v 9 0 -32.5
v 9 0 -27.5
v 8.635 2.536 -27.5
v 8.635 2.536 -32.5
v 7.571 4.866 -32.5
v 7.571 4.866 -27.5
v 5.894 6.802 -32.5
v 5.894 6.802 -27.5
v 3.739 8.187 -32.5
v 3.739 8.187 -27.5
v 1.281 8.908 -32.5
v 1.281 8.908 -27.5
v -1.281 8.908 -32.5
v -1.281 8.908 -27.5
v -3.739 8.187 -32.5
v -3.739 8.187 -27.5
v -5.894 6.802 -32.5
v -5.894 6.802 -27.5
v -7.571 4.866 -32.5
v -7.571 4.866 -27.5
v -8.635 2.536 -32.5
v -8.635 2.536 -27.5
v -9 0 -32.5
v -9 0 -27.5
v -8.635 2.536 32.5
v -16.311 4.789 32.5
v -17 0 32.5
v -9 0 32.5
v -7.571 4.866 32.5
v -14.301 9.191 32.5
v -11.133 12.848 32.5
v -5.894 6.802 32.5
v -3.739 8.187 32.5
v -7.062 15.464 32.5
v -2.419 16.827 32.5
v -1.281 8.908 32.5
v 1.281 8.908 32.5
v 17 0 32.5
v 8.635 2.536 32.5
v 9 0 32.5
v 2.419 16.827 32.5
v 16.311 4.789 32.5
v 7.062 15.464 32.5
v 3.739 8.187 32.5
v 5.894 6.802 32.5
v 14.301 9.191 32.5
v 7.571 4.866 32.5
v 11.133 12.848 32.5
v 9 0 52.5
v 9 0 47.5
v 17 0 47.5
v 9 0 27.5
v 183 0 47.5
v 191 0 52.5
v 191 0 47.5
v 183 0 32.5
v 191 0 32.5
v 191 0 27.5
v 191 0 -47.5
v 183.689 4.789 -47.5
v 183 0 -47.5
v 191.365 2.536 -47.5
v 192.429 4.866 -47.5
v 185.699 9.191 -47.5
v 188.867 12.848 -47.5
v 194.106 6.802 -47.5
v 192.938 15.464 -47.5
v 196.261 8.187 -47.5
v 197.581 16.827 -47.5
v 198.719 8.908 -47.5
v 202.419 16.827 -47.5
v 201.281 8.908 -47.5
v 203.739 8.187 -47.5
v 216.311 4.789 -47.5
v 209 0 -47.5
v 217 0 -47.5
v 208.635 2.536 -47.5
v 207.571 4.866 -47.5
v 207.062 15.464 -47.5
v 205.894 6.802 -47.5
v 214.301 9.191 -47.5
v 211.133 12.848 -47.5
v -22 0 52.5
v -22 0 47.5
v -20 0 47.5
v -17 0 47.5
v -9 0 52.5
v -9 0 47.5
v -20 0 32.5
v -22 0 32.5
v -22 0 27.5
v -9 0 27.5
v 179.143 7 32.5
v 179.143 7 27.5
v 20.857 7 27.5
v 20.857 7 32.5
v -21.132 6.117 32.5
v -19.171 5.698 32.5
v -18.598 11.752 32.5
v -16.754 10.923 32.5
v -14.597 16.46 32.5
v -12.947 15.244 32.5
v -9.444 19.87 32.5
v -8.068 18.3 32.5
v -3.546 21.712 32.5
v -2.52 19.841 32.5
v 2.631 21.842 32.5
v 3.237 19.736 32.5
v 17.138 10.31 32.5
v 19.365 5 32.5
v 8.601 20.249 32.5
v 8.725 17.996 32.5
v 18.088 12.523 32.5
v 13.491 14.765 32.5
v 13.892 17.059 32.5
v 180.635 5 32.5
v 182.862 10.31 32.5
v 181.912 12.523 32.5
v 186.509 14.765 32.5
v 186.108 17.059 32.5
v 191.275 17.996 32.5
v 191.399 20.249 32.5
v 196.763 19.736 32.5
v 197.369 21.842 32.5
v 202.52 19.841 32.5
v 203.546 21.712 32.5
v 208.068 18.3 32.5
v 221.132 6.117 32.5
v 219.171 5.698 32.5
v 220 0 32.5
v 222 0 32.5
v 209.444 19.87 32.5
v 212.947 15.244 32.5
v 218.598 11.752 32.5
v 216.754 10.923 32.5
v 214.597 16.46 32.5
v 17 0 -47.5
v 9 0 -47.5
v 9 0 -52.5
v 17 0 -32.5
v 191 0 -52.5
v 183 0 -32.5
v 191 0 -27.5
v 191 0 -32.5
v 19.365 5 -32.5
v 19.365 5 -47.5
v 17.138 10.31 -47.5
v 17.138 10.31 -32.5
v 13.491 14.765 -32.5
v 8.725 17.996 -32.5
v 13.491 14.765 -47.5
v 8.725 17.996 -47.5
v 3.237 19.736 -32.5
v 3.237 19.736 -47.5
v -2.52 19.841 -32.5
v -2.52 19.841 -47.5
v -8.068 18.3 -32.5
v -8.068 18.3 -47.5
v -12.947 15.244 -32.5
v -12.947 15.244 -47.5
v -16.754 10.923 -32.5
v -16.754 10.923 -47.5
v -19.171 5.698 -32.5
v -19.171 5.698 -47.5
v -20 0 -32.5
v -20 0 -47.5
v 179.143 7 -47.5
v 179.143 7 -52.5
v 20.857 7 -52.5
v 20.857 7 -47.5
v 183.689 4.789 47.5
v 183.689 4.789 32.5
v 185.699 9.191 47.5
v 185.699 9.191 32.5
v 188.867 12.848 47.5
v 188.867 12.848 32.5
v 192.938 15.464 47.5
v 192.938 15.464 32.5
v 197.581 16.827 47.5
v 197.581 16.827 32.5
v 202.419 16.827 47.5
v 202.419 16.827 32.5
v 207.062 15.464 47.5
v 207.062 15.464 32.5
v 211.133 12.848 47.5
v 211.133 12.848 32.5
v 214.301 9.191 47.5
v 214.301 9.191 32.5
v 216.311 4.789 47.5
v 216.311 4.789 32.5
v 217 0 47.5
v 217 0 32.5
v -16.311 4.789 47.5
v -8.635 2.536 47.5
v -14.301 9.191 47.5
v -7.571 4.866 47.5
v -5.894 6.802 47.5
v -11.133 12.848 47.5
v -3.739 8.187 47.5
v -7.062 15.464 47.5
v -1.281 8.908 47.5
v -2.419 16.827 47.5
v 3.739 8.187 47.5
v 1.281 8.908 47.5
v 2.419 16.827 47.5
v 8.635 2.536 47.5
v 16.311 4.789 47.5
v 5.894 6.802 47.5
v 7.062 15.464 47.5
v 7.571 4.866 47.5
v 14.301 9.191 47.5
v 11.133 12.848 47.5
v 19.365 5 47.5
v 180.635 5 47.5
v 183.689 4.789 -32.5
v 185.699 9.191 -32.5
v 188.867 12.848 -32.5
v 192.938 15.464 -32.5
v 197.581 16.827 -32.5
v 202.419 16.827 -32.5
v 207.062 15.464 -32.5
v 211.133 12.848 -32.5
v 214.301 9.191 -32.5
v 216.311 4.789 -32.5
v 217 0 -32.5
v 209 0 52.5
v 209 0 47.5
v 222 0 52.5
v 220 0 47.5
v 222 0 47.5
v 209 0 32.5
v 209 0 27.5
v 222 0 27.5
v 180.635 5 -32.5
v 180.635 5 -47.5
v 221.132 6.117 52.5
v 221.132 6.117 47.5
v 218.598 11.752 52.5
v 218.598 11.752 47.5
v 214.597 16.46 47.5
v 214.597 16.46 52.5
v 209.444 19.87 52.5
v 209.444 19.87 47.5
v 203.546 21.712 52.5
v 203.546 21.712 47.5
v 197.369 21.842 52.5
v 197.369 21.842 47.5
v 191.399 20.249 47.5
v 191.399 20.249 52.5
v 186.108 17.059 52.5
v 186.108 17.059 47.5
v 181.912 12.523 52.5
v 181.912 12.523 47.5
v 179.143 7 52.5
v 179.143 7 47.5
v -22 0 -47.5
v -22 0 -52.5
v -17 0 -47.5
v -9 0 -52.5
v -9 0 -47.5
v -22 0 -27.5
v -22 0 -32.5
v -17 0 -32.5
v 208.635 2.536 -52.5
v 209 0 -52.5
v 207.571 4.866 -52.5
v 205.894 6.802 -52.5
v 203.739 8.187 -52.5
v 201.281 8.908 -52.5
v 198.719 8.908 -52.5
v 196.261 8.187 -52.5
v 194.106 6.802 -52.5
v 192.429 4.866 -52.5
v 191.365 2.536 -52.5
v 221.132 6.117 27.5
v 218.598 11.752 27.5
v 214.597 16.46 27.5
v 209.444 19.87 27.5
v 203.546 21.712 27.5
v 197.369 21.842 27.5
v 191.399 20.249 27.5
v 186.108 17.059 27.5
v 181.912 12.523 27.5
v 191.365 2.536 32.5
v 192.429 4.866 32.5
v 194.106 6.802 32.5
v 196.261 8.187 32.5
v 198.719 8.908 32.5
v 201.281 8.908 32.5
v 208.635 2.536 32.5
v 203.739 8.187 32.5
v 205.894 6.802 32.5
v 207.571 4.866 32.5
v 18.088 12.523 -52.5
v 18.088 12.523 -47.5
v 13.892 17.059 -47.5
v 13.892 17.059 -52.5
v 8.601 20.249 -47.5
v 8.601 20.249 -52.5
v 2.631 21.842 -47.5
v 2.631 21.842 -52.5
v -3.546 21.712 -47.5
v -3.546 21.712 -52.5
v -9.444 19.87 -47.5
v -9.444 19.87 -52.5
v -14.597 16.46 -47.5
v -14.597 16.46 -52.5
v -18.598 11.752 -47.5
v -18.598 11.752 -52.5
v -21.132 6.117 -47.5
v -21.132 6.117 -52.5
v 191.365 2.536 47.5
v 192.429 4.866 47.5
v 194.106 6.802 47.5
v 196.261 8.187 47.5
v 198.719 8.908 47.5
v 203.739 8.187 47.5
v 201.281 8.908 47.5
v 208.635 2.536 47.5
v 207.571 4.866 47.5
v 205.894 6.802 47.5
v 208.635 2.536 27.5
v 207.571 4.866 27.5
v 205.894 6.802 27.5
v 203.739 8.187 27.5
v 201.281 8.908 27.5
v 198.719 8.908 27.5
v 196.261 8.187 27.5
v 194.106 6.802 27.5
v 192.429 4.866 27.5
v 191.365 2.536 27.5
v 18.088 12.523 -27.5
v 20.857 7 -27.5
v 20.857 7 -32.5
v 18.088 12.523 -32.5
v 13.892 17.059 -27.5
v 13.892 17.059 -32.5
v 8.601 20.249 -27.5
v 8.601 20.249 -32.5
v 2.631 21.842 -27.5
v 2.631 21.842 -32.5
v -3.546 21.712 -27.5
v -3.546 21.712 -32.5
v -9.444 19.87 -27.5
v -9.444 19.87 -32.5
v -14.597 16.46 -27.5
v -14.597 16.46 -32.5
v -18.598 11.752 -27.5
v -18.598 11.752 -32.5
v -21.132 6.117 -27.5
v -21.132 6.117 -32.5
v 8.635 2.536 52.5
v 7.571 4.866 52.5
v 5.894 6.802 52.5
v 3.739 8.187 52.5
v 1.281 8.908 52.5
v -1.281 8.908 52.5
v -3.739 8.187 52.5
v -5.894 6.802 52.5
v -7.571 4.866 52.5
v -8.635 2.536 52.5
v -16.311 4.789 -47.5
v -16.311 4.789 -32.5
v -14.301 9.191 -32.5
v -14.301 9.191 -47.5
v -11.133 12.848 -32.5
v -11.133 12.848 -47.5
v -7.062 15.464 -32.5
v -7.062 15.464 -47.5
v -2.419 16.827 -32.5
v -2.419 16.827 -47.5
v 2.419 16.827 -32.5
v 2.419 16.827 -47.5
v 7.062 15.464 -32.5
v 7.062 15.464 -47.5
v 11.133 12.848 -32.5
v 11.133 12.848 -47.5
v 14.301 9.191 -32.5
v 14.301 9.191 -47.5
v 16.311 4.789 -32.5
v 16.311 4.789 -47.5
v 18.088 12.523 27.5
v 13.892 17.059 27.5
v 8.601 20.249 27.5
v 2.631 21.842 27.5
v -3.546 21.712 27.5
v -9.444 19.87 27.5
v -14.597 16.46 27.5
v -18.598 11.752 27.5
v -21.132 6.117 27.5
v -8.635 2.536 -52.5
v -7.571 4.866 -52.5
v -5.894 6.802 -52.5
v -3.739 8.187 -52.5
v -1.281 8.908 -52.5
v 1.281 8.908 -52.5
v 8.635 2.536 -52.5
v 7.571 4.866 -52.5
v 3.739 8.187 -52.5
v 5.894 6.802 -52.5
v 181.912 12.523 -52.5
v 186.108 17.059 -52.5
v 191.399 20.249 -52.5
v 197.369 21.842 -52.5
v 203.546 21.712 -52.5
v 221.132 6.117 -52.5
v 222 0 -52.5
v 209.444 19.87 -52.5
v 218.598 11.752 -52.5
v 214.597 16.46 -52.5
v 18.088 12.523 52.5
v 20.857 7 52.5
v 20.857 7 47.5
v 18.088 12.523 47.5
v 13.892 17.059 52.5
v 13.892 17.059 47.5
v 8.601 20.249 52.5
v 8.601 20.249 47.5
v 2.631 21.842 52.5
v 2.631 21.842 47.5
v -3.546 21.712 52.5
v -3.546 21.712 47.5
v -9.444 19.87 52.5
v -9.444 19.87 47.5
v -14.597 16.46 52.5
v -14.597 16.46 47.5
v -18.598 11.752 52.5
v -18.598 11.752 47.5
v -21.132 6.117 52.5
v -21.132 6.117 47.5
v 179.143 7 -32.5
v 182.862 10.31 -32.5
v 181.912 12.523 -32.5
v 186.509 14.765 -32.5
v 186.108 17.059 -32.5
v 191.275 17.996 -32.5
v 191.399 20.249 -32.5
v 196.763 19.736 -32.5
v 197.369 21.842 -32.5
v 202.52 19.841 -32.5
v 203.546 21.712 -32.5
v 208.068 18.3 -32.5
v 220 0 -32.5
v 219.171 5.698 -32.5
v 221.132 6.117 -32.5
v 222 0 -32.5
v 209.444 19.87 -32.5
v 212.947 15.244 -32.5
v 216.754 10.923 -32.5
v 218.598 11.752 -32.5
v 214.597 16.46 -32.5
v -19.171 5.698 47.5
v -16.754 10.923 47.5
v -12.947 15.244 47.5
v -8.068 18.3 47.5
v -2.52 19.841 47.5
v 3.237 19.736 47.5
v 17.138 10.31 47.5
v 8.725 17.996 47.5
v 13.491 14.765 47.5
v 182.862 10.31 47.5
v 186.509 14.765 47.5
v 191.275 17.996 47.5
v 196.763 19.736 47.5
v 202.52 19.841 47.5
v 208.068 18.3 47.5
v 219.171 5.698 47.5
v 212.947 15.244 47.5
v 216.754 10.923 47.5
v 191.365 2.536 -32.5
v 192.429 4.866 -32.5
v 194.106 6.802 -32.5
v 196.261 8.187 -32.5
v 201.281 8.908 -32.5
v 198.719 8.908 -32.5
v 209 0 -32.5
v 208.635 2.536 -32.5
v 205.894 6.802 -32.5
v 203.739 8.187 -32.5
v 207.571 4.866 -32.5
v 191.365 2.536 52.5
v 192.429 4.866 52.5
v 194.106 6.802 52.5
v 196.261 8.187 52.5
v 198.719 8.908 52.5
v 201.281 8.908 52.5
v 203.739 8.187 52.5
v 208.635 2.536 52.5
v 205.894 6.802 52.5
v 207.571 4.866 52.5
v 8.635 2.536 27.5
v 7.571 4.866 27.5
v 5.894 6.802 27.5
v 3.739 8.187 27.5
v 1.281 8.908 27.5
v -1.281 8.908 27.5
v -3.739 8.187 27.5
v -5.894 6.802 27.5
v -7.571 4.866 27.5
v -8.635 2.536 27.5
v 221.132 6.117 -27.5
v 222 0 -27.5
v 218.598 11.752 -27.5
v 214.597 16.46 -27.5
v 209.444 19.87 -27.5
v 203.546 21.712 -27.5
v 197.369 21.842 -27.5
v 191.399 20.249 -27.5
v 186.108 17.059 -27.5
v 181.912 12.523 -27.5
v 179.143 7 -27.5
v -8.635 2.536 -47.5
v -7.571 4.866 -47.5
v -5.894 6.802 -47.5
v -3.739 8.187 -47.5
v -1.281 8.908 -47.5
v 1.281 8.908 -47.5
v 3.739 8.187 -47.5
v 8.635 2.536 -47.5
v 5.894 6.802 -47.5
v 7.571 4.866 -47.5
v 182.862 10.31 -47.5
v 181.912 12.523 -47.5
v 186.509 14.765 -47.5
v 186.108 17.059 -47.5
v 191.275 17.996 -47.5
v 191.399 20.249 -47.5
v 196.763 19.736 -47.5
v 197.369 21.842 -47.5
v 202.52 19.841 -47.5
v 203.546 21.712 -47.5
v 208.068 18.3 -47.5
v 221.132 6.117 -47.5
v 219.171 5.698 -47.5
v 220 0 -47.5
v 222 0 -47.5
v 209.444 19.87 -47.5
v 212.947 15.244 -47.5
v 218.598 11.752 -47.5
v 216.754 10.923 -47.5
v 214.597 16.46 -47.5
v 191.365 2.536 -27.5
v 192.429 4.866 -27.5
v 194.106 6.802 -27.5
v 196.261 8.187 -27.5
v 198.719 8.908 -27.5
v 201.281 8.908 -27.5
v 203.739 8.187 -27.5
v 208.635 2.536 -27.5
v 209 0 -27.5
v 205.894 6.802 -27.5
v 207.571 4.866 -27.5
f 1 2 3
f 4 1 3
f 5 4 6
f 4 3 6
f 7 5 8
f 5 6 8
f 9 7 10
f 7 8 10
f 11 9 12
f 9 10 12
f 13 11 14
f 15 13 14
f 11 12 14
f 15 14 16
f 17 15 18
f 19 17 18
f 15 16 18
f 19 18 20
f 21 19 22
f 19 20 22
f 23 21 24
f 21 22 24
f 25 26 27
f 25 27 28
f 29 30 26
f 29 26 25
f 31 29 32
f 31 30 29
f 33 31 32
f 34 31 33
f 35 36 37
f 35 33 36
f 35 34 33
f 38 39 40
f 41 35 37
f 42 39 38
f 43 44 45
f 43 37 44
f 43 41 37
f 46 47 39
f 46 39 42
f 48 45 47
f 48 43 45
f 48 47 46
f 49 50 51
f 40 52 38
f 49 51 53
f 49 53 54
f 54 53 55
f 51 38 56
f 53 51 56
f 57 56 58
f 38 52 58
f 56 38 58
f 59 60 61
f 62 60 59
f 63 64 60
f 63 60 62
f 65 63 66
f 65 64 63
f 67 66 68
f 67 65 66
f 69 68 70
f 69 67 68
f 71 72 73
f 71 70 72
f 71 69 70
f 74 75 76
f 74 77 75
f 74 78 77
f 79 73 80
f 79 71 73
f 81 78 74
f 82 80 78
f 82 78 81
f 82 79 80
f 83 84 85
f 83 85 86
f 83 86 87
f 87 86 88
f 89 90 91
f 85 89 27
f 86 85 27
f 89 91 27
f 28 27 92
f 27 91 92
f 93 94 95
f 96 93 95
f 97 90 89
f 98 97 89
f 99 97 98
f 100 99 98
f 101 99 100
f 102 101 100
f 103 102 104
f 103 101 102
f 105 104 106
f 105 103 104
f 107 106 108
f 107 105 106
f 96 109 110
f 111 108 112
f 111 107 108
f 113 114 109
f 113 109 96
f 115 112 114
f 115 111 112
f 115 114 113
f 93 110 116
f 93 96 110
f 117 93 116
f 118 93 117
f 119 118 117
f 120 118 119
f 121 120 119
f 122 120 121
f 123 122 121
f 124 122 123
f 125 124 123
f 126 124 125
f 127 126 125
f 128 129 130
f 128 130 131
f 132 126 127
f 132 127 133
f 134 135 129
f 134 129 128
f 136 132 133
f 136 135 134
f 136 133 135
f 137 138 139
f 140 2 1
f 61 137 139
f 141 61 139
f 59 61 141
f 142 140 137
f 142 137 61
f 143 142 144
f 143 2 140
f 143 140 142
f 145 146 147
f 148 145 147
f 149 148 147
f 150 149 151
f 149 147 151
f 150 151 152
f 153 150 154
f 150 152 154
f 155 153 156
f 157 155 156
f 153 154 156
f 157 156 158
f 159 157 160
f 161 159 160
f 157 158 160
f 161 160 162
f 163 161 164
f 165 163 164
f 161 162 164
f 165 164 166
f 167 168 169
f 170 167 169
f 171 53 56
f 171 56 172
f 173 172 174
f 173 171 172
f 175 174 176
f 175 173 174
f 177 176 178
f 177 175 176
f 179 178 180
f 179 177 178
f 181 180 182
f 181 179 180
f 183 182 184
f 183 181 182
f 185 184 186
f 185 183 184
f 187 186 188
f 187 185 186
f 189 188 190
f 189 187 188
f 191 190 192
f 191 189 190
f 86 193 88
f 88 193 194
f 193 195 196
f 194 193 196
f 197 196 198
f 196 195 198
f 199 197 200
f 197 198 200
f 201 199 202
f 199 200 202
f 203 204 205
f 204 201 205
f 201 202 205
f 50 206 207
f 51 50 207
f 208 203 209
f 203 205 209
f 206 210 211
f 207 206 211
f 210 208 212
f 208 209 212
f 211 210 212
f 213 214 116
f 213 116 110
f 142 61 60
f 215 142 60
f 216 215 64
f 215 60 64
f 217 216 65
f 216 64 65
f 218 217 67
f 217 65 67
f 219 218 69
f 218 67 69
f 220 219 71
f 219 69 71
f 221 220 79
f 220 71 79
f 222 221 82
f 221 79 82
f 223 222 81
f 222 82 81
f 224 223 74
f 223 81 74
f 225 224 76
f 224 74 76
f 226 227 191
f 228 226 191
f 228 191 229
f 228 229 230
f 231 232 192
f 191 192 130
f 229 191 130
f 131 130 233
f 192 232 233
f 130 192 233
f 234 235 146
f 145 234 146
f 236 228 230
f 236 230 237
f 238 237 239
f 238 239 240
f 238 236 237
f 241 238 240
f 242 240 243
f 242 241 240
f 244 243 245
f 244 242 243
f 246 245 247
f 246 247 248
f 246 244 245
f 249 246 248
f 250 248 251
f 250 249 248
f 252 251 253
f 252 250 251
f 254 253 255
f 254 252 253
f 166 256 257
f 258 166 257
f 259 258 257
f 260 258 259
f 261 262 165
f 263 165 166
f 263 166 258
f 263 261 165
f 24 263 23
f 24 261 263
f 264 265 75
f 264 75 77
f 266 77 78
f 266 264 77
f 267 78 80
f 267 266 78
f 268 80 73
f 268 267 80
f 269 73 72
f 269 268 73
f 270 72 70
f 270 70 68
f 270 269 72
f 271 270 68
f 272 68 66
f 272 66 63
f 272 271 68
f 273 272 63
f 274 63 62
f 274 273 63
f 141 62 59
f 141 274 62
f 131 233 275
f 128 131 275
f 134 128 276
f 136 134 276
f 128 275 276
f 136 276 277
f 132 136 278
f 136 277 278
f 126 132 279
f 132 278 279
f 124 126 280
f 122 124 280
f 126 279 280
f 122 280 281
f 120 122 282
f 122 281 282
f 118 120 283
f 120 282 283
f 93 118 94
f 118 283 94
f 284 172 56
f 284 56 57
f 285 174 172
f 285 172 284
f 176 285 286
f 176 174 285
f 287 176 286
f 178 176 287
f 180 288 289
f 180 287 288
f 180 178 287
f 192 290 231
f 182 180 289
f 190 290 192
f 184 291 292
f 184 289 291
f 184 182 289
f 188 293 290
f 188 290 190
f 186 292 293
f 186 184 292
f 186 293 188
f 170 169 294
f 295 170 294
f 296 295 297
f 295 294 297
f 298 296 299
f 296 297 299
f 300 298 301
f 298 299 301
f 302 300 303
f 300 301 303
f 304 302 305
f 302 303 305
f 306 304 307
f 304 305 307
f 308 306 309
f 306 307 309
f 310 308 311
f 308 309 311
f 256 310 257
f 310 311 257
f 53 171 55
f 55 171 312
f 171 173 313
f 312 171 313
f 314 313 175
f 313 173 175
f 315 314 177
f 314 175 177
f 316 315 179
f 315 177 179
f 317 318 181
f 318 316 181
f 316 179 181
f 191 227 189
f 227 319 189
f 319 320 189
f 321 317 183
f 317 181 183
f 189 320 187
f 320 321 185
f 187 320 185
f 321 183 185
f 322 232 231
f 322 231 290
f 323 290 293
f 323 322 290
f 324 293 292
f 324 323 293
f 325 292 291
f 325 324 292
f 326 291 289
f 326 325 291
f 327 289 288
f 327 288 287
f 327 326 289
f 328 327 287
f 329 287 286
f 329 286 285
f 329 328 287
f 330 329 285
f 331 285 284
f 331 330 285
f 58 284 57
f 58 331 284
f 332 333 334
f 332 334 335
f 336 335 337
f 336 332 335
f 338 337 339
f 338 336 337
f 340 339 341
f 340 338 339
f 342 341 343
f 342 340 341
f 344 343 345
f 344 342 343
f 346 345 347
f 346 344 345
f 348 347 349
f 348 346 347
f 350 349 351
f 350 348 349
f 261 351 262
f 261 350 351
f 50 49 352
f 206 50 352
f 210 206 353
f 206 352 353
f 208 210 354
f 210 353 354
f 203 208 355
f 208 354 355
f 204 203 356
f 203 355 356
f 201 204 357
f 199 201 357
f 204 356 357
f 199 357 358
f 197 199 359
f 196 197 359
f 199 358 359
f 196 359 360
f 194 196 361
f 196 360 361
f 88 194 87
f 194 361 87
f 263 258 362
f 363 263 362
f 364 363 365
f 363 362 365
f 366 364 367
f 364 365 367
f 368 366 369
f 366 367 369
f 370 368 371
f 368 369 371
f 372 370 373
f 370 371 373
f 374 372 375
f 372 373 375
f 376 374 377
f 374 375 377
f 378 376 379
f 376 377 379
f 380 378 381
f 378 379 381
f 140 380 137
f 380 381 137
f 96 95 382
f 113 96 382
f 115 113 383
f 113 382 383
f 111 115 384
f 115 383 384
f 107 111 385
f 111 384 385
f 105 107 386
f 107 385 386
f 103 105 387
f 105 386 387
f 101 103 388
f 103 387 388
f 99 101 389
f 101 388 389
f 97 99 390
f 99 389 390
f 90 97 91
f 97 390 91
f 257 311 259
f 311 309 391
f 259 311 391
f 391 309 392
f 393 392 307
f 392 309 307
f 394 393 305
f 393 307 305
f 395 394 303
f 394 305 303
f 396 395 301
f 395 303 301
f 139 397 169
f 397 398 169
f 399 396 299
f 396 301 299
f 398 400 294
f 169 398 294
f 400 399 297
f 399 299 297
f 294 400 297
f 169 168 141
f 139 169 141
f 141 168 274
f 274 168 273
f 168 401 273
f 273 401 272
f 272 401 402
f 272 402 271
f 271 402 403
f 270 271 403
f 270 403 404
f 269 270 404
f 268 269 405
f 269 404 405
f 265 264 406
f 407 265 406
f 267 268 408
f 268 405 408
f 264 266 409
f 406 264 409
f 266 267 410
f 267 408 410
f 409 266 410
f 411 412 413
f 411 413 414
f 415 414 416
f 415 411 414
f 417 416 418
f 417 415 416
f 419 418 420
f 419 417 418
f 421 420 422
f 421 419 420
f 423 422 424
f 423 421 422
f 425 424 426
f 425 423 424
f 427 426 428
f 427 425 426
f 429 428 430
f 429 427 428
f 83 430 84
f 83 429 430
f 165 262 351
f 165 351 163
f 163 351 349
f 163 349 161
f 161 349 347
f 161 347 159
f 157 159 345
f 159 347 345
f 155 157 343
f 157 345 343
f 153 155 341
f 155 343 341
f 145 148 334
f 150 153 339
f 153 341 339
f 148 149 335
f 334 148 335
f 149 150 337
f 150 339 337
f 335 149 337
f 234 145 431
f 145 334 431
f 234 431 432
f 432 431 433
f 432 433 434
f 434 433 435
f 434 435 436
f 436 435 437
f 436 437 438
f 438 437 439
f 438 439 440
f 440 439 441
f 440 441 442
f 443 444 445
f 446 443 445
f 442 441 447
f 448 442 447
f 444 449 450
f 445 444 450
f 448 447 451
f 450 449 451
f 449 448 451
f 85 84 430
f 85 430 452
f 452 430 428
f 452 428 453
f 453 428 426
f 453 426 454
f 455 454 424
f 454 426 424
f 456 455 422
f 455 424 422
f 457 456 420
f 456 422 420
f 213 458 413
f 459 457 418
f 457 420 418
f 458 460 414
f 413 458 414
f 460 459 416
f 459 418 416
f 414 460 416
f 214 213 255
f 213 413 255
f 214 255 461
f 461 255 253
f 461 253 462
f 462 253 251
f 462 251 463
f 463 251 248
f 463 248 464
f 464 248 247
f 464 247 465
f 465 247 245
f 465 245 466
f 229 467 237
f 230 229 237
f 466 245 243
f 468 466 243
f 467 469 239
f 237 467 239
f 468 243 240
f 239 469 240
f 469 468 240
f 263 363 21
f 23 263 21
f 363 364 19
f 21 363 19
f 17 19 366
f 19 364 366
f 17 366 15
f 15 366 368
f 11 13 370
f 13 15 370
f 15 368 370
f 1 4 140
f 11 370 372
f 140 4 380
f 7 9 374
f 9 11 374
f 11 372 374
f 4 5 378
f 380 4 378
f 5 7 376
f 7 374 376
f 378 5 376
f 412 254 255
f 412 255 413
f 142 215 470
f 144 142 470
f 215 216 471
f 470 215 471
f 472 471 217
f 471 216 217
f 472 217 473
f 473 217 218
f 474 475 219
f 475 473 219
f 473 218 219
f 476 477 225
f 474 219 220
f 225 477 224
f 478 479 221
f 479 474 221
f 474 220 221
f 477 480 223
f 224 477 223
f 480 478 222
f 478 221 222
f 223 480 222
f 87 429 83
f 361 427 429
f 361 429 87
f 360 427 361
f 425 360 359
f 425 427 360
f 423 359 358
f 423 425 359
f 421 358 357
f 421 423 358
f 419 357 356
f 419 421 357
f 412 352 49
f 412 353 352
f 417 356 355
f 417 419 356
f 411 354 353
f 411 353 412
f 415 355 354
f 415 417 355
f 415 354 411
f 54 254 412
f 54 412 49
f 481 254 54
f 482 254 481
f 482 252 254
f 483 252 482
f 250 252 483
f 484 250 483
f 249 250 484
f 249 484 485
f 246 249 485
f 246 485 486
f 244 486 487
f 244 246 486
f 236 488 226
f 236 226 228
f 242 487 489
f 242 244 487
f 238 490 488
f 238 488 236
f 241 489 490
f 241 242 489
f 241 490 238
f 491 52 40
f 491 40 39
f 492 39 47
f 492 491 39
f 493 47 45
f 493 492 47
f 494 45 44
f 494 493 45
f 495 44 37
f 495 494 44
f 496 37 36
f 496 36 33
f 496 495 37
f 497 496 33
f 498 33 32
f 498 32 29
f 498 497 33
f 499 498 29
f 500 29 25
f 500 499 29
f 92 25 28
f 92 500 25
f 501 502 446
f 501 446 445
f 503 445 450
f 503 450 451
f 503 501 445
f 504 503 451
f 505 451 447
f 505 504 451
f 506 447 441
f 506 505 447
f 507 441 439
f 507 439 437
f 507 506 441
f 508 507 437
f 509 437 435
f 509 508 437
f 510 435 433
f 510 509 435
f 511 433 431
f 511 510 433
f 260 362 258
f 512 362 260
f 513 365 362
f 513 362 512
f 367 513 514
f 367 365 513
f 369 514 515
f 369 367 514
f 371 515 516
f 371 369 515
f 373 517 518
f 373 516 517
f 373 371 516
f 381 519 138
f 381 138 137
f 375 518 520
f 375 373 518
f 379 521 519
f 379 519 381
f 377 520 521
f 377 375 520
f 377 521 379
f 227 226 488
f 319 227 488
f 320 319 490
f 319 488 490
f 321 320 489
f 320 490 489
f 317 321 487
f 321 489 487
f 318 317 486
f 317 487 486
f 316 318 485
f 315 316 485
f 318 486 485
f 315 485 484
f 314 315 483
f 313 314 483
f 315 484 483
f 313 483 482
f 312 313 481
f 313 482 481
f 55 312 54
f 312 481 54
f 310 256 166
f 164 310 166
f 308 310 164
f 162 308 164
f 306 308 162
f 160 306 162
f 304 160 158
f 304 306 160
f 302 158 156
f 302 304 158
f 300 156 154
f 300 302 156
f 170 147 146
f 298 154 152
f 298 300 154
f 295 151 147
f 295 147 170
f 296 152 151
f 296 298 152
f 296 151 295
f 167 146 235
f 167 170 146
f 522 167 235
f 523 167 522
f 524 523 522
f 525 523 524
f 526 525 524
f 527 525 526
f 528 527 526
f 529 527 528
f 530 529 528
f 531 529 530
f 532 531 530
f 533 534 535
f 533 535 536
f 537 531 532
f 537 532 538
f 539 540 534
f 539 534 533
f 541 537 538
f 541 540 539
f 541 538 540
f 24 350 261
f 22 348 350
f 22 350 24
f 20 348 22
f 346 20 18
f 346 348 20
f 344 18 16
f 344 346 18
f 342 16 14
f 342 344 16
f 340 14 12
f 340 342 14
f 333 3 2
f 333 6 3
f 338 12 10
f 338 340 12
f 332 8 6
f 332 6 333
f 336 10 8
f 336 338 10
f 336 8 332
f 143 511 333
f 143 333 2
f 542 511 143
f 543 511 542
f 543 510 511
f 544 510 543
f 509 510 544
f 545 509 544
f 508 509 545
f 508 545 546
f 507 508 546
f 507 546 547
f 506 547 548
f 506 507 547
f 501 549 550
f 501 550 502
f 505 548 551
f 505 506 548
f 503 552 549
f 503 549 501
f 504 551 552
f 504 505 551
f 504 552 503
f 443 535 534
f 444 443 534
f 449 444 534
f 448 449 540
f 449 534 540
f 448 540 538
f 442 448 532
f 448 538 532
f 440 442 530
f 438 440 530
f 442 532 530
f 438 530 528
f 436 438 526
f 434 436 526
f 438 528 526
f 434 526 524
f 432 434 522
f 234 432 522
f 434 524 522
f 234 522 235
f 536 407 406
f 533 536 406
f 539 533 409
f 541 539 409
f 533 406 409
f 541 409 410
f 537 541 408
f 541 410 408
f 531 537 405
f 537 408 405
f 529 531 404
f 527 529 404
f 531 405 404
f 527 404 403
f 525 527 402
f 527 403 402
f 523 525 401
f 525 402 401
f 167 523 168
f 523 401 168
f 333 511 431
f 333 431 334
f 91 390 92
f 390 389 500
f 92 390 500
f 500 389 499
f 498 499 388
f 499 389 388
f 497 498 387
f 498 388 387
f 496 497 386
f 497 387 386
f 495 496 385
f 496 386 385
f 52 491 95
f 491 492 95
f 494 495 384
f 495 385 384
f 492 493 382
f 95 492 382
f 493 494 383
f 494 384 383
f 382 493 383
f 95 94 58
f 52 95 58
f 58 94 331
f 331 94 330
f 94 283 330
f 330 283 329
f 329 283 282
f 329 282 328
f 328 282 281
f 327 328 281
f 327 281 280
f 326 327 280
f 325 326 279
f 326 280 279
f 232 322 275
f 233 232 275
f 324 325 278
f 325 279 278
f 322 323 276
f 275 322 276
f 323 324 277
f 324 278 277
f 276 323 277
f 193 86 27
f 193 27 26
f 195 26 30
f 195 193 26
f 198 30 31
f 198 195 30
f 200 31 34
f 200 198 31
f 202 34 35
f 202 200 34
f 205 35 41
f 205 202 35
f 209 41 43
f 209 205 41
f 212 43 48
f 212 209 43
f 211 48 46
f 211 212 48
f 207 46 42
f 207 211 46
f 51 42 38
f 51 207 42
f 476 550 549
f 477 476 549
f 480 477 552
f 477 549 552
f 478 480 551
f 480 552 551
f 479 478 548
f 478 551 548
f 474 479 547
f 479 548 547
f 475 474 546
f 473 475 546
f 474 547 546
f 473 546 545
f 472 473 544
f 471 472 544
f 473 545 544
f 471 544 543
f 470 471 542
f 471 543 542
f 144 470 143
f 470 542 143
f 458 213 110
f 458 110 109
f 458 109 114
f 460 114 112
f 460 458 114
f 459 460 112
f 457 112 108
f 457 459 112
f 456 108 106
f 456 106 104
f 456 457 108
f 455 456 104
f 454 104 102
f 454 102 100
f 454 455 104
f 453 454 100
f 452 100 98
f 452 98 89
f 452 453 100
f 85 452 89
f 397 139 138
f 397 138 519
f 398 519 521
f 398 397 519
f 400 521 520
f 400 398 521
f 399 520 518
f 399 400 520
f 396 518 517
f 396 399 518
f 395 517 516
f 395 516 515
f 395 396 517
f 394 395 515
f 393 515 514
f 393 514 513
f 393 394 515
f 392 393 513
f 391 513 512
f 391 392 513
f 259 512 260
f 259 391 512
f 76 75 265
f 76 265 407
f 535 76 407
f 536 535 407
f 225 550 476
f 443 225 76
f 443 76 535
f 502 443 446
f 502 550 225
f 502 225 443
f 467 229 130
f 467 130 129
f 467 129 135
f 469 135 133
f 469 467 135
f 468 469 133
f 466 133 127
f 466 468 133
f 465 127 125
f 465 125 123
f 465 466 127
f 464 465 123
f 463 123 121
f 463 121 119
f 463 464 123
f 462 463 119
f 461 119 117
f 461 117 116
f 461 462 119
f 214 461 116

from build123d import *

# Parameters (mm, degrees)
BOSS_EXTRUDE1_DEPTH     = 47.5
CUT_EXTRUDE1_DEPTH      = 226.956301085
CUT_EXTRUDE1_DEPTH_BACK = 226.956301085
SKETCH3_W               = 80
SKETCH3_H               = 1000
BOSS_EXTRUDE2_START     = 5
BOSS_EXTRUDE2_DEPTH     = 5


with BuildPart() as part:
    # Sketch2 → Boss-Extrude1 (new, symmetric)
    with BuildSketch(Plane.XY):
        with BuildLine():
            Line((-20, 0), (-17, 0))
            ThreePointArc((-17, 0), (0, 17), (17, 0))
            Line((17, 0), (20, 0))
            ThreePointArc((20, 0), (19.840593925, 2.52008585), (19.364916731, 5))
            ThreePointArc((19.364916731, 5), (-2.52008585, 19.840593925), (-20, 0))
        make_face()
        with BuildLine():
            Line((180.635083269, 5), (19.364916731, 5))
            ThreePointArc((19.364916731, 5), (19.840593925, 2.52008585), (20, 0))
            Line((20, 0), (180, 0))
            ThreePointArc((180, 0), (180.159406075, 2.52008585), (180.635083269, 5))
        make_face()
        with BuildLine():
            ThreePointArc((220, 0), (202.52008585, 19.840593925), (180.635083269, 5))
            ThreePointArc((180.635083269, 5), (180.159406075, 2.52008585), (180, 0))
            Line((180, 0), (183, 0))
            ThreePointArc((183, 0), (200, 17), (217, 0))
            Line((217, 0), (220, 0))
        make_face()
    extrude(amount=BOSS_EXTRUDE1_DEPTH, both=True)

    # Sketch3 → Cut-Extrude1 (cut, two sides: drawn at the far end of the back side and taken through both)
    with BuildSketch(Plane(origin=(0, 0, 0), x_dir=(0, 0, -1), z_dir=(1, 0, 0)).offset(-CUT_EXTRUDE1_DEPTH_BACK)):
        with Locations((7.5, 0)):
            Rectangle(SKETCH3_W, SKETCH3_H)
    extrude(amount=CUT_EXTRUDE1_DEPTH + CUT_EXTRUDE1_DEPTH_BACK, mode=Mode.SUBTRACT)

    # Sketch4 → Boss-Extrude2 (add)
    with BuildSketch(Plane.XY.offset(47.5).offset(BOSS_EXTRUDE2_START)):
        with BuildLine():
            Line((179.143346385, 7), (20.856653615, 7))
            ThreePointArc((20.856653615, 7), (-3.546379878, 21.712282003), (-22, 0))
            Line((-22, 0), (-20, 0))
            ThreePointArc((-20, 0), (-2.52008585, 19.840593925), (19.364916731, 5))
            Line((19.364916731, 5), (180.635083269, 5))
            ThreePointArc((180.635083269, 5), (202.52008585, 19.840593925), (220, 0))
            Line((220, 0), (222, 0))
            ThreePointArc((222, 0), (203.546379878, 21.712282003), (179.143346385, 7))
        make_face()
        with BuildLine():
            Line((180.635083269, 5), (19.364916731, 5))
            ThreePointArc((19.364916731, 5), (-2.52008585, 19.840593925), (-20, 0))
            Line((-20, 0), (-17, 0))
            ThreePointArc((-17, 0), (0, 17), (17, 0))
            Line((17, 0), (183, 0))
            ThreePointArc((183, 0), (200, 17), (217, 0))
            Line((217, 0), (220, 0))
            ThreePointArc((220, 0), (202.52008585, 19.840593925), (180.635083269, 5))
        make_face()
        with BuildLine():
            ThreePointArc((9, 0), (0, 9), (-9, 0))
            Line((-9, 0), (-17, 0))
            ThreePointArc((-17, 0), (0, 17), (17, 0))
            Line((17, 0), (9, 0))
        make_face()
        with BuildLine():
            ThreePointArc((209, 0), (200, 9), (191, 0))
            Line((191, 0), (183, 0))
            ThreePointArc((183, 0), (200, 17), (217, 0))
            Line((217, 0), (209, 0))
        make_face()
    boss_extrude2 = extrude(amount=-BOSS_EXTRUDE2_DEPTH)

    # Mirror1: Boss-Extrude2 across plane
    add(boss_extrude2.mirror(Plane(origin=(0, 0, 40), x_dir=(1, 0, 0), z_dir=(0, 0, -1))))


with BuildPart() as body_2:
    # Mirror4: mirrored copy
    add(part.part.mirror(Plane.XY))


solid = Compound([part.part, body_2.part])
